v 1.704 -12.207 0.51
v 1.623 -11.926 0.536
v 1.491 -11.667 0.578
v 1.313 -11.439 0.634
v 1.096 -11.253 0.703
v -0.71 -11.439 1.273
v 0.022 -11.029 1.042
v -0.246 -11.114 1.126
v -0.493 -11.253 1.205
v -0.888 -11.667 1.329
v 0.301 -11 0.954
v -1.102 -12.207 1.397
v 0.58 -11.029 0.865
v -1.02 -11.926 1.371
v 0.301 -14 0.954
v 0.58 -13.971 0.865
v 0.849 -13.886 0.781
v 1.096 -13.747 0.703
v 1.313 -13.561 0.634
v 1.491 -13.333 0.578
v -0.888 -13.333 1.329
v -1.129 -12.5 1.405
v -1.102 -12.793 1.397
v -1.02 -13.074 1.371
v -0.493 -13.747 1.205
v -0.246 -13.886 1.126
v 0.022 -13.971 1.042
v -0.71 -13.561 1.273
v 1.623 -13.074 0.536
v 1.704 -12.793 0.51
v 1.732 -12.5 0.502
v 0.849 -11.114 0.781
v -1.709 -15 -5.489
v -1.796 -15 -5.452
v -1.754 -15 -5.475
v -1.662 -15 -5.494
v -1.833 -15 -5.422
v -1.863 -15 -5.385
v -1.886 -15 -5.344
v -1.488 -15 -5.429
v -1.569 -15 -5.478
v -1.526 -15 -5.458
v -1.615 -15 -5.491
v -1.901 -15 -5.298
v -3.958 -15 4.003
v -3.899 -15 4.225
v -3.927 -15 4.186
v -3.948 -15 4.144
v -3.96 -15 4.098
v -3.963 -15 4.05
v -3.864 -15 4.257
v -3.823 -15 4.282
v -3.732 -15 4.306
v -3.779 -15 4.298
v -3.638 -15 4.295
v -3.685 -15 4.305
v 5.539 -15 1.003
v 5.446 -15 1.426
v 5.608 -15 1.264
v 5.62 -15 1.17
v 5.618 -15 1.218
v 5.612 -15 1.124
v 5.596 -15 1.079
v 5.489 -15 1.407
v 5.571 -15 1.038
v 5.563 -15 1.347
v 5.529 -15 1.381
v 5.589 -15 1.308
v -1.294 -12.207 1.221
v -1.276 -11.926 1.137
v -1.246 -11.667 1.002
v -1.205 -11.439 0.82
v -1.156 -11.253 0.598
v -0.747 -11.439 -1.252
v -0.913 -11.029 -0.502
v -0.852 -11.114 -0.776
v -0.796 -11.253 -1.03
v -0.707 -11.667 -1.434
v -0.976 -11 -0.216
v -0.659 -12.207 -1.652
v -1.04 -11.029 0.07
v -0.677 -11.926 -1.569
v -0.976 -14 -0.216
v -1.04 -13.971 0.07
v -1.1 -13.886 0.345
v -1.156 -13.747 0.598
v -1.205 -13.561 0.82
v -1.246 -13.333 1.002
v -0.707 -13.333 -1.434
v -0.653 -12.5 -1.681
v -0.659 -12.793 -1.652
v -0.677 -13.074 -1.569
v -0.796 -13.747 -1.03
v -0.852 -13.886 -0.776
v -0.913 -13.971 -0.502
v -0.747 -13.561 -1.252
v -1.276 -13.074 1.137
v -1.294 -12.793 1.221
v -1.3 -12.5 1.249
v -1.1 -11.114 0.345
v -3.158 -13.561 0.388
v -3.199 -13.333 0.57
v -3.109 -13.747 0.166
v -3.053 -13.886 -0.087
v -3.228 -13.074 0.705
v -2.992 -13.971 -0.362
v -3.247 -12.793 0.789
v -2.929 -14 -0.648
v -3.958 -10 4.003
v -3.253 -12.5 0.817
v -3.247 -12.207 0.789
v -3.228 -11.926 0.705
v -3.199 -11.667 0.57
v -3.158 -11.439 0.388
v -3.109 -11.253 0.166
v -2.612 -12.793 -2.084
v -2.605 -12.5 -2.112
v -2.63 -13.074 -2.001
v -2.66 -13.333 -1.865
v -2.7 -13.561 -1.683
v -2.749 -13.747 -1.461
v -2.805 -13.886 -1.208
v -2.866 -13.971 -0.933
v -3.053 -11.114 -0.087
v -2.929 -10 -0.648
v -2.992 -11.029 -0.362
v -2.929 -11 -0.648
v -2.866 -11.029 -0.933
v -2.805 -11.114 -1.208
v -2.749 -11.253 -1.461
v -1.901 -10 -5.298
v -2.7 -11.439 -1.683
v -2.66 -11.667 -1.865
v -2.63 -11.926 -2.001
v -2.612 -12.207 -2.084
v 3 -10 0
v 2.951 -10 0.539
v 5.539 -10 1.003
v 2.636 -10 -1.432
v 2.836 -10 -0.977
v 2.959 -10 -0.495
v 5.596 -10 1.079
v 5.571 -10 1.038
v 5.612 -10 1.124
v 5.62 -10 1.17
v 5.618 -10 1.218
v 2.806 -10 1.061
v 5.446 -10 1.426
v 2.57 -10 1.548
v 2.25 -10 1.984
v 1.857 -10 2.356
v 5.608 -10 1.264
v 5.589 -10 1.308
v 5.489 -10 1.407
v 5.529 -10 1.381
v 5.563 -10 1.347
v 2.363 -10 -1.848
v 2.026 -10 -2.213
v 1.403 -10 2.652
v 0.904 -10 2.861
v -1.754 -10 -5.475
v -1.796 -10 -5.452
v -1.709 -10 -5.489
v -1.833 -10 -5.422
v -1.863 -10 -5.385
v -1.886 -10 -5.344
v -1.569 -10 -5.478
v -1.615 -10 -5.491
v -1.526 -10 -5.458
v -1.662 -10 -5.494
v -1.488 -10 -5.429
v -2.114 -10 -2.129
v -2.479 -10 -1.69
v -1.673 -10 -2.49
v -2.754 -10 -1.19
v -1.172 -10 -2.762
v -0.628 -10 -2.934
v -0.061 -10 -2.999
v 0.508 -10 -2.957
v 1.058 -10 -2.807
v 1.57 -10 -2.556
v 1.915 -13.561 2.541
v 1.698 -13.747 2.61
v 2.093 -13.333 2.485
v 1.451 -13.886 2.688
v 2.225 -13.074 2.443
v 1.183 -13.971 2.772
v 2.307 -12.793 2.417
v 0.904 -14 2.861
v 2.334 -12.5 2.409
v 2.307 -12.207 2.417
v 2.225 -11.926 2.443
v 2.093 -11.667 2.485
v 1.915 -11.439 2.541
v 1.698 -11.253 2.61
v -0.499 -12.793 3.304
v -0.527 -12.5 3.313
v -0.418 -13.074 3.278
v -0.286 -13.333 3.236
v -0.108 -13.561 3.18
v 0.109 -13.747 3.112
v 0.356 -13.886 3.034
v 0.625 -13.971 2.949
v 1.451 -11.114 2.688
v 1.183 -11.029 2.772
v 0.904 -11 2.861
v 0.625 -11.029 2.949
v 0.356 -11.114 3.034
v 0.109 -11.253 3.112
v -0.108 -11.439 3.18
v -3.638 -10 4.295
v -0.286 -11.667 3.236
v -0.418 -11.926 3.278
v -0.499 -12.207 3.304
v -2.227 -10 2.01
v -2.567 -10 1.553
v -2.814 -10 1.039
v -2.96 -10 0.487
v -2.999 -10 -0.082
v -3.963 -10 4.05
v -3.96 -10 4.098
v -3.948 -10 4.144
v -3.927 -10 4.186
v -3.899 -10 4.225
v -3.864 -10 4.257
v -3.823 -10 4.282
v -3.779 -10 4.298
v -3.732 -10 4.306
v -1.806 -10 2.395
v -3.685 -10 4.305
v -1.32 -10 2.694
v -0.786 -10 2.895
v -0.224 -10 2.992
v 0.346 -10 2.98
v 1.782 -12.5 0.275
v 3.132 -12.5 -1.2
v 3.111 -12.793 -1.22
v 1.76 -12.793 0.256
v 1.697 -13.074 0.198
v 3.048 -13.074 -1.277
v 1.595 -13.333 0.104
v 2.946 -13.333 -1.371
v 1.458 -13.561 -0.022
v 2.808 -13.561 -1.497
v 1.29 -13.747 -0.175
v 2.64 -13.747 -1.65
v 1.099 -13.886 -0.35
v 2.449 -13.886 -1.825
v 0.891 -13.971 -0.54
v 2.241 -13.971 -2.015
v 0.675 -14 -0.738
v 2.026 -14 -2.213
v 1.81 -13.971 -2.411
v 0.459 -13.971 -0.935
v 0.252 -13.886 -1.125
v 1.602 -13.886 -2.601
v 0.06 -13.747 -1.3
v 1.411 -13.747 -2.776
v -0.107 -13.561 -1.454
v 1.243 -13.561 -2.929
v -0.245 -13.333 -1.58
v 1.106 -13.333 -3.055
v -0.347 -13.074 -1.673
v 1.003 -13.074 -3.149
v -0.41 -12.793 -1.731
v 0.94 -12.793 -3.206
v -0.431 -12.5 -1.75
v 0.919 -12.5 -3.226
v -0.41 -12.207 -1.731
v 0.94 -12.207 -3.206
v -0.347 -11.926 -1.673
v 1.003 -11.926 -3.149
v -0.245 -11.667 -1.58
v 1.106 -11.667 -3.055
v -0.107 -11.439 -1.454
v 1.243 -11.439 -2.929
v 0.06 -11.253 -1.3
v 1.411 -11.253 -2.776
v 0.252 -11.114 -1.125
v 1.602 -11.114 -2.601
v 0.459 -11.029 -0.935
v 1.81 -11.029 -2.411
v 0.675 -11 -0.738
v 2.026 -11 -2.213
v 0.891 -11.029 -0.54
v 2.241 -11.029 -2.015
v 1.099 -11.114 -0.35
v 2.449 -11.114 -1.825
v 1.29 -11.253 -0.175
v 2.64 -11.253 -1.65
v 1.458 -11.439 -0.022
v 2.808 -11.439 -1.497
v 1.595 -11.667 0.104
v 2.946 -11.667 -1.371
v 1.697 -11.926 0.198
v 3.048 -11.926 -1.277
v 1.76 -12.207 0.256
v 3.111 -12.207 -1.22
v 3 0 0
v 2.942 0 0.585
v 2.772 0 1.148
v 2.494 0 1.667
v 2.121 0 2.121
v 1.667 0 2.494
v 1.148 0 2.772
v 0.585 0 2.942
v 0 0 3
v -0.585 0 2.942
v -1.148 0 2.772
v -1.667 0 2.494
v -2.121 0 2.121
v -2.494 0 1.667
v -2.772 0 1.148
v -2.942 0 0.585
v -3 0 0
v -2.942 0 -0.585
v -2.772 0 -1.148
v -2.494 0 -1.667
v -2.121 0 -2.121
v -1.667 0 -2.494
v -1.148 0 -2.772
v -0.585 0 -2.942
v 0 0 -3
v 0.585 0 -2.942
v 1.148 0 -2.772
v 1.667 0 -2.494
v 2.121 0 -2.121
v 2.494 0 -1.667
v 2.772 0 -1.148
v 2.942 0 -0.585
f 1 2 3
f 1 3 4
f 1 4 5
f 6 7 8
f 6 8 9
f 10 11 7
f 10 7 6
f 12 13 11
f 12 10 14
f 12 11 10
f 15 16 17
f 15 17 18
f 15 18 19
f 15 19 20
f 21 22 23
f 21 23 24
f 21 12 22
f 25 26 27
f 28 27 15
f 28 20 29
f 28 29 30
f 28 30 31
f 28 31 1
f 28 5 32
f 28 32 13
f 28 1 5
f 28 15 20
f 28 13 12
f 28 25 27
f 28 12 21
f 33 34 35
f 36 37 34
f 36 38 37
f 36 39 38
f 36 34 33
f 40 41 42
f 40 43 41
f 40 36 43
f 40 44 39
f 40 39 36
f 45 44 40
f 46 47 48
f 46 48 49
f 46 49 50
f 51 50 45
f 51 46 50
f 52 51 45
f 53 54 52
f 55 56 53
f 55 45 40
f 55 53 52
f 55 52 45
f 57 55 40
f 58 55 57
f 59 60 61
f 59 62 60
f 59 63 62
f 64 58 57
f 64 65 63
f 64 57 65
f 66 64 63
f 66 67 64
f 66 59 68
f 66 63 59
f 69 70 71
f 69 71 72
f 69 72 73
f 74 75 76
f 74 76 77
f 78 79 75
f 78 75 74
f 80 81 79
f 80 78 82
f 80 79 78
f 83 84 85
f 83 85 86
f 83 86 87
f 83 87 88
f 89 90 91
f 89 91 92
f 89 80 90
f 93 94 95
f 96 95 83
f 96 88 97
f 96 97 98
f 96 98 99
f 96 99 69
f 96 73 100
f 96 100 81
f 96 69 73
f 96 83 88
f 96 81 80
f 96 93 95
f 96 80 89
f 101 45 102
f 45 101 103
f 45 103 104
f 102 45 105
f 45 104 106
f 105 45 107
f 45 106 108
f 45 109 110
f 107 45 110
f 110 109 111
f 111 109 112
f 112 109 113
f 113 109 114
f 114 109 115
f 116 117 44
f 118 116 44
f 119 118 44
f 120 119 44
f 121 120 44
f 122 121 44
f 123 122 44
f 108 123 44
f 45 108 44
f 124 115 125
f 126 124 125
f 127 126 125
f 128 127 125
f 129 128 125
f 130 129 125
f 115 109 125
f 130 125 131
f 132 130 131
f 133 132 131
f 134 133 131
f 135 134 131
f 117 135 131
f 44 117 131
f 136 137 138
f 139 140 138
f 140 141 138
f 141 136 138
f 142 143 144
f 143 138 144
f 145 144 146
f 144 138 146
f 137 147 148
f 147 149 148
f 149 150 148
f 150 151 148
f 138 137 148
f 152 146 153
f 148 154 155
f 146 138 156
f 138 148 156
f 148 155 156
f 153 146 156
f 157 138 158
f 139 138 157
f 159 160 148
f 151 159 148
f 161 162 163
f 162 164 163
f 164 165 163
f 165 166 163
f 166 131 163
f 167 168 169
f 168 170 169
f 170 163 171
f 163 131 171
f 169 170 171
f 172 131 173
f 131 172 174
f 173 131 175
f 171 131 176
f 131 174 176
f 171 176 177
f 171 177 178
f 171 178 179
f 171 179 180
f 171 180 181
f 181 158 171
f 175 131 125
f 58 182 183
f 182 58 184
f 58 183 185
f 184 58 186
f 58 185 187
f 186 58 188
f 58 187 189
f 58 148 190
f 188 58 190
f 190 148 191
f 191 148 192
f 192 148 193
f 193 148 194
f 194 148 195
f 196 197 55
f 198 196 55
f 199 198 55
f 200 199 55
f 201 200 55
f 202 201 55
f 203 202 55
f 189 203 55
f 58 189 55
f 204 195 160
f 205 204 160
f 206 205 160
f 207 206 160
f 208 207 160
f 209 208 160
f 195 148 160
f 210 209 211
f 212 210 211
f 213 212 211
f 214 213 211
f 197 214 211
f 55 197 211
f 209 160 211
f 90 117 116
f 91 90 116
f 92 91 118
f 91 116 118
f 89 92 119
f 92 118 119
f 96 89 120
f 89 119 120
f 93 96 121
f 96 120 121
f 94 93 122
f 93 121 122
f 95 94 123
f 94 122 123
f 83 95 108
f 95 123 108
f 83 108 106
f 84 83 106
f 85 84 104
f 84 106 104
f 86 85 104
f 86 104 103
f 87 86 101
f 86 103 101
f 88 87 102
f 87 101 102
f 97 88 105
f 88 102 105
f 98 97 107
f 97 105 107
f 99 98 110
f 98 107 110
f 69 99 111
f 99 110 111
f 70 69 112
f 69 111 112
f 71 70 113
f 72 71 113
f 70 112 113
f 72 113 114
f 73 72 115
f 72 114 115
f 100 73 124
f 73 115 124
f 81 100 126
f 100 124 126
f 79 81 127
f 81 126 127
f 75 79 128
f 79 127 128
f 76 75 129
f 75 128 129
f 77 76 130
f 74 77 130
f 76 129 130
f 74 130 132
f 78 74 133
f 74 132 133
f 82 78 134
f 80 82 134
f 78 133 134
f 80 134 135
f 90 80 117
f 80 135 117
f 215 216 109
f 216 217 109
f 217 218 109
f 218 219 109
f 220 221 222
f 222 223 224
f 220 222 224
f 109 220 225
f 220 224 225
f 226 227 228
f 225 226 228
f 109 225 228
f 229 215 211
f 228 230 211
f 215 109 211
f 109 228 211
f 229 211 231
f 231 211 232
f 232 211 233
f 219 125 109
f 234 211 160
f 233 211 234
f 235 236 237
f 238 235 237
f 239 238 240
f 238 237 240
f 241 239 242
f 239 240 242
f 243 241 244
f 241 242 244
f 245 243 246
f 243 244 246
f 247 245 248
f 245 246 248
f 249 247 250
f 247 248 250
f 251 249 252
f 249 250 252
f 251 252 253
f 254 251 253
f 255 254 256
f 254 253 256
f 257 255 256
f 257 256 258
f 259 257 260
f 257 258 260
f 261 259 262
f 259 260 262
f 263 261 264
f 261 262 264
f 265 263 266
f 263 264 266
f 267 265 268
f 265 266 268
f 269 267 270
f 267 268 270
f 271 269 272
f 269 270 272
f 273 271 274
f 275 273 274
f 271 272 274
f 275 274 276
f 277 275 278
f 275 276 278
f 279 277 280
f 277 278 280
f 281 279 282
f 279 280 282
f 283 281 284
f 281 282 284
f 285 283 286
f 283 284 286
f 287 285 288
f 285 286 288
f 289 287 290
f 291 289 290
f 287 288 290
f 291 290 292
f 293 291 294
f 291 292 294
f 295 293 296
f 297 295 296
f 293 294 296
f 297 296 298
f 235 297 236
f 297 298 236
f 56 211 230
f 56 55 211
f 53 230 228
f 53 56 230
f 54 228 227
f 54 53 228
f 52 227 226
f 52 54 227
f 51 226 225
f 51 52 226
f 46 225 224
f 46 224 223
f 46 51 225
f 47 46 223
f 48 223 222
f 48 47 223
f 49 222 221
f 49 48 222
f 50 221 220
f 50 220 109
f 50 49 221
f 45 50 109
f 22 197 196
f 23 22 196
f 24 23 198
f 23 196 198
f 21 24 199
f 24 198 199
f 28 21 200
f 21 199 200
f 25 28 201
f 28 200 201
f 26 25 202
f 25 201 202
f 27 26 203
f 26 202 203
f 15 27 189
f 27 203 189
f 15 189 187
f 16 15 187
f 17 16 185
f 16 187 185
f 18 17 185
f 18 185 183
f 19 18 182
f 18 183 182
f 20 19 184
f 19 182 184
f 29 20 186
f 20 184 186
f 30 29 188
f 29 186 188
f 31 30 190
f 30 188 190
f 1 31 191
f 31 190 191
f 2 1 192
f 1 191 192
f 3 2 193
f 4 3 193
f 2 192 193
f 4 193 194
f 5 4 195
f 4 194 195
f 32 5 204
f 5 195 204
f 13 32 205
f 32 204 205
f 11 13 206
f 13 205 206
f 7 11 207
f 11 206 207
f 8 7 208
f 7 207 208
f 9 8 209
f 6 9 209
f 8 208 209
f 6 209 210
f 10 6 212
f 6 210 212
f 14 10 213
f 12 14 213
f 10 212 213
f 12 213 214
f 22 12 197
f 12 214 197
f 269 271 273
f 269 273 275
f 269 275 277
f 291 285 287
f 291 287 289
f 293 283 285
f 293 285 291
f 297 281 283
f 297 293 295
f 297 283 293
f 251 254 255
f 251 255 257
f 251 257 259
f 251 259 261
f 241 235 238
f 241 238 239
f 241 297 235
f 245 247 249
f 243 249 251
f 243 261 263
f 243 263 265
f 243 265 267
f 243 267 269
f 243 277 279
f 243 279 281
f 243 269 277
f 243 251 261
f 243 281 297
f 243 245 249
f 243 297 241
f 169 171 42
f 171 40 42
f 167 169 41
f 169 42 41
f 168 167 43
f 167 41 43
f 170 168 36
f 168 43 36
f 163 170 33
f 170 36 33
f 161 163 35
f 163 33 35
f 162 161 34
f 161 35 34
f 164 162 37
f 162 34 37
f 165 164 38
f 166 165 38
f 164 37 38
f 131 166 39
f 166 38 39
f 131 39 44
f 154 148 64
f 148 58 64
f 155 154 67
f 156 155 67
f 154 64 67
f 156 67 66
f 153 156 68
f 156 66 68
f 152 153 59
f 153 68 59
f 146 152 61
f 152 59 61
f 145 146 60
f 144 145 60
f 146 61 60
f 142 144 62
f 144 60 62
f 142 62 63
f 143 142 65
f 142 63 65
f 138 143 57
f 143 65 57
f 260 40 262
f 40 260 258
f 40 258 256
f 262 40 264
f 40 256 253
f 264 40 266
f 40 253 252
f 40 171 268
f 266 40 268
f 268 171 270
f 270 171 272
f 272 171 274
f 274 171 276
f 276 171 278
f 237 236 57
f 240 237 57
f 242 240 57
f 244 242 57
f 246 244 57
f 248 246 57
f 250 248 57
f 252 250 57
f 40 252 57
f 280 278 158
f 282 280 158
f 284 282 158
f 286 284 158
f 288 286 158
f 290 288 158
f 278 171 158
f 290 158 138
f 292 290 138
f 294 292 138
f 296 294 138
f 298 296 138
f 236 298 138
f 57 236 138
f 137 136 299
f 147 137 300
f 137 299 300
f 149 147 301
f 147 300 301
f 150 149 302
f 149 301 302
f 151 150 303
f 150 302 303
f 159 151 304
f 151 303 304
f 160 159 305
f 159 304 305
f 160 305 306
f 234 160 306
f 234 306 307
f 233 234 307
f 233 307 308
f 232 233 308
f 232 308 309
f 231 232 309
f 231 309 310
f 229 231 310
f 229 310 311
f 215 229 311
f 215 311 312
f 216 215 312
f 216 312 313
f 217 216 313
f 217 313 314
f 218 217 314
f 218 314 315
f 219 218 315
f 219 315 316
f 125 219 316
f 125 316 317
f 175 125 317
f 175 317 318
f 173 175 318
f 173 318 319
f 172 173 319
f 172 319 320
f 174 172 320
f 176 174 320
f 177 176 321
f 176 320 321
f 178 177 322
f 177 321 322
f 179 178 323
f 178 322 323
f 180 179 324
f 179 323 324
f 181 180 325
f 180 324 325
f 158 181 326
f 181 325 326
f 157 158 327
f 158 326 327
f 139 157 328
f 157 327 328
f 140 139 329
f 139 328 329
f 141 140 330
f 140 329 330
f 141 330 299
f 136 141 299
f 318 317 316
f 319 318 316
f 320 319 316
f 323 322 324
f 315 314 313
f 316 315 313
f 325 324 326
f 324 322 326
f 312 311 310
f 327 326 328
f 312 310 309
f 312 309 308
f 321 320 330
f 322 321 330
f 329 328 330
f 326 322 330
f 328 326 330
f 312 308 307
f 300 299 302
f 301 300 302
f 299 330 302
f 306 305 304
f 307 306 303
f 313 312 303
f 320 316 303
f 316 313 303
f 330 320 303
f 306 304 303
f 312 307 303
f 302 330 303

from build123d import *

# Parameters (mm, degrees)
F0_R            = 3
F1_DEPTH        = 10
F3_DEPTH        = 5
F5_R            = 1.5
F6_DEPTH        = 2
F6_COPIES_COUNT = 3
F7_R            = 0.25


# Not quite as in the source:
# - a pattern or mirror of a feature is missing from the dataset's text; its kind, count and spacing are read off the source's solid


with BuildPart() as f1:
    # F0 (on Front) → F1 (new body)
    with BuildSketch(Plane.XZ):
        Circle(F0_R)
    extrude(amount=F1_DEPTH)

    # F2 (on face) → F3 (join)
    with BuildSketch(Plane.XZ.offset(10)):
        Polygon((5.858499572, 1.2953697407), (-4.0510728887, 4.4259245871), (-1.8074266833, -5.7212943277), align=None)
    extrude(amount=F3_DEPTH)

    # F5 (on face) → F6 (cut)
    with BuildSketch(Plane(origin=(2.0255364444, 0, -2.2129622935), x_dir=(0.7376540978, 0, 0.6751788148), z_dir=(0.6751788148, 0, -0.7376540978))):
        with Locations((0, 12.5)):
            Circle(F5_R)
    f6 = extrude(amount=-F6_DEPTH, mode=Mode.SUBTRACT)

    # F6_copies: F6 ×3 about axis
    f6_copies_axis = Axis((0, 0, 0), (0, 1, 0))
    for i in range(1, F6_COPIES_COUNT):
        add(f6.rotate(f6_copies_axis, i * 360 / F6_COPIES_COUNT), mode=Mode.SUBTRACT)

    # F7
    f7_edges = [f1.edges().sort_by_distance(p)[0] for p in [
        (5.8585, -12.5, 1.29537),
        (-4.051073, -12.5, 4.425925),
        (-1.807427, -12.5, -5.721294),
    ]]
    fillet(f7_edges, radius=F7_R)


solid = f1.part
